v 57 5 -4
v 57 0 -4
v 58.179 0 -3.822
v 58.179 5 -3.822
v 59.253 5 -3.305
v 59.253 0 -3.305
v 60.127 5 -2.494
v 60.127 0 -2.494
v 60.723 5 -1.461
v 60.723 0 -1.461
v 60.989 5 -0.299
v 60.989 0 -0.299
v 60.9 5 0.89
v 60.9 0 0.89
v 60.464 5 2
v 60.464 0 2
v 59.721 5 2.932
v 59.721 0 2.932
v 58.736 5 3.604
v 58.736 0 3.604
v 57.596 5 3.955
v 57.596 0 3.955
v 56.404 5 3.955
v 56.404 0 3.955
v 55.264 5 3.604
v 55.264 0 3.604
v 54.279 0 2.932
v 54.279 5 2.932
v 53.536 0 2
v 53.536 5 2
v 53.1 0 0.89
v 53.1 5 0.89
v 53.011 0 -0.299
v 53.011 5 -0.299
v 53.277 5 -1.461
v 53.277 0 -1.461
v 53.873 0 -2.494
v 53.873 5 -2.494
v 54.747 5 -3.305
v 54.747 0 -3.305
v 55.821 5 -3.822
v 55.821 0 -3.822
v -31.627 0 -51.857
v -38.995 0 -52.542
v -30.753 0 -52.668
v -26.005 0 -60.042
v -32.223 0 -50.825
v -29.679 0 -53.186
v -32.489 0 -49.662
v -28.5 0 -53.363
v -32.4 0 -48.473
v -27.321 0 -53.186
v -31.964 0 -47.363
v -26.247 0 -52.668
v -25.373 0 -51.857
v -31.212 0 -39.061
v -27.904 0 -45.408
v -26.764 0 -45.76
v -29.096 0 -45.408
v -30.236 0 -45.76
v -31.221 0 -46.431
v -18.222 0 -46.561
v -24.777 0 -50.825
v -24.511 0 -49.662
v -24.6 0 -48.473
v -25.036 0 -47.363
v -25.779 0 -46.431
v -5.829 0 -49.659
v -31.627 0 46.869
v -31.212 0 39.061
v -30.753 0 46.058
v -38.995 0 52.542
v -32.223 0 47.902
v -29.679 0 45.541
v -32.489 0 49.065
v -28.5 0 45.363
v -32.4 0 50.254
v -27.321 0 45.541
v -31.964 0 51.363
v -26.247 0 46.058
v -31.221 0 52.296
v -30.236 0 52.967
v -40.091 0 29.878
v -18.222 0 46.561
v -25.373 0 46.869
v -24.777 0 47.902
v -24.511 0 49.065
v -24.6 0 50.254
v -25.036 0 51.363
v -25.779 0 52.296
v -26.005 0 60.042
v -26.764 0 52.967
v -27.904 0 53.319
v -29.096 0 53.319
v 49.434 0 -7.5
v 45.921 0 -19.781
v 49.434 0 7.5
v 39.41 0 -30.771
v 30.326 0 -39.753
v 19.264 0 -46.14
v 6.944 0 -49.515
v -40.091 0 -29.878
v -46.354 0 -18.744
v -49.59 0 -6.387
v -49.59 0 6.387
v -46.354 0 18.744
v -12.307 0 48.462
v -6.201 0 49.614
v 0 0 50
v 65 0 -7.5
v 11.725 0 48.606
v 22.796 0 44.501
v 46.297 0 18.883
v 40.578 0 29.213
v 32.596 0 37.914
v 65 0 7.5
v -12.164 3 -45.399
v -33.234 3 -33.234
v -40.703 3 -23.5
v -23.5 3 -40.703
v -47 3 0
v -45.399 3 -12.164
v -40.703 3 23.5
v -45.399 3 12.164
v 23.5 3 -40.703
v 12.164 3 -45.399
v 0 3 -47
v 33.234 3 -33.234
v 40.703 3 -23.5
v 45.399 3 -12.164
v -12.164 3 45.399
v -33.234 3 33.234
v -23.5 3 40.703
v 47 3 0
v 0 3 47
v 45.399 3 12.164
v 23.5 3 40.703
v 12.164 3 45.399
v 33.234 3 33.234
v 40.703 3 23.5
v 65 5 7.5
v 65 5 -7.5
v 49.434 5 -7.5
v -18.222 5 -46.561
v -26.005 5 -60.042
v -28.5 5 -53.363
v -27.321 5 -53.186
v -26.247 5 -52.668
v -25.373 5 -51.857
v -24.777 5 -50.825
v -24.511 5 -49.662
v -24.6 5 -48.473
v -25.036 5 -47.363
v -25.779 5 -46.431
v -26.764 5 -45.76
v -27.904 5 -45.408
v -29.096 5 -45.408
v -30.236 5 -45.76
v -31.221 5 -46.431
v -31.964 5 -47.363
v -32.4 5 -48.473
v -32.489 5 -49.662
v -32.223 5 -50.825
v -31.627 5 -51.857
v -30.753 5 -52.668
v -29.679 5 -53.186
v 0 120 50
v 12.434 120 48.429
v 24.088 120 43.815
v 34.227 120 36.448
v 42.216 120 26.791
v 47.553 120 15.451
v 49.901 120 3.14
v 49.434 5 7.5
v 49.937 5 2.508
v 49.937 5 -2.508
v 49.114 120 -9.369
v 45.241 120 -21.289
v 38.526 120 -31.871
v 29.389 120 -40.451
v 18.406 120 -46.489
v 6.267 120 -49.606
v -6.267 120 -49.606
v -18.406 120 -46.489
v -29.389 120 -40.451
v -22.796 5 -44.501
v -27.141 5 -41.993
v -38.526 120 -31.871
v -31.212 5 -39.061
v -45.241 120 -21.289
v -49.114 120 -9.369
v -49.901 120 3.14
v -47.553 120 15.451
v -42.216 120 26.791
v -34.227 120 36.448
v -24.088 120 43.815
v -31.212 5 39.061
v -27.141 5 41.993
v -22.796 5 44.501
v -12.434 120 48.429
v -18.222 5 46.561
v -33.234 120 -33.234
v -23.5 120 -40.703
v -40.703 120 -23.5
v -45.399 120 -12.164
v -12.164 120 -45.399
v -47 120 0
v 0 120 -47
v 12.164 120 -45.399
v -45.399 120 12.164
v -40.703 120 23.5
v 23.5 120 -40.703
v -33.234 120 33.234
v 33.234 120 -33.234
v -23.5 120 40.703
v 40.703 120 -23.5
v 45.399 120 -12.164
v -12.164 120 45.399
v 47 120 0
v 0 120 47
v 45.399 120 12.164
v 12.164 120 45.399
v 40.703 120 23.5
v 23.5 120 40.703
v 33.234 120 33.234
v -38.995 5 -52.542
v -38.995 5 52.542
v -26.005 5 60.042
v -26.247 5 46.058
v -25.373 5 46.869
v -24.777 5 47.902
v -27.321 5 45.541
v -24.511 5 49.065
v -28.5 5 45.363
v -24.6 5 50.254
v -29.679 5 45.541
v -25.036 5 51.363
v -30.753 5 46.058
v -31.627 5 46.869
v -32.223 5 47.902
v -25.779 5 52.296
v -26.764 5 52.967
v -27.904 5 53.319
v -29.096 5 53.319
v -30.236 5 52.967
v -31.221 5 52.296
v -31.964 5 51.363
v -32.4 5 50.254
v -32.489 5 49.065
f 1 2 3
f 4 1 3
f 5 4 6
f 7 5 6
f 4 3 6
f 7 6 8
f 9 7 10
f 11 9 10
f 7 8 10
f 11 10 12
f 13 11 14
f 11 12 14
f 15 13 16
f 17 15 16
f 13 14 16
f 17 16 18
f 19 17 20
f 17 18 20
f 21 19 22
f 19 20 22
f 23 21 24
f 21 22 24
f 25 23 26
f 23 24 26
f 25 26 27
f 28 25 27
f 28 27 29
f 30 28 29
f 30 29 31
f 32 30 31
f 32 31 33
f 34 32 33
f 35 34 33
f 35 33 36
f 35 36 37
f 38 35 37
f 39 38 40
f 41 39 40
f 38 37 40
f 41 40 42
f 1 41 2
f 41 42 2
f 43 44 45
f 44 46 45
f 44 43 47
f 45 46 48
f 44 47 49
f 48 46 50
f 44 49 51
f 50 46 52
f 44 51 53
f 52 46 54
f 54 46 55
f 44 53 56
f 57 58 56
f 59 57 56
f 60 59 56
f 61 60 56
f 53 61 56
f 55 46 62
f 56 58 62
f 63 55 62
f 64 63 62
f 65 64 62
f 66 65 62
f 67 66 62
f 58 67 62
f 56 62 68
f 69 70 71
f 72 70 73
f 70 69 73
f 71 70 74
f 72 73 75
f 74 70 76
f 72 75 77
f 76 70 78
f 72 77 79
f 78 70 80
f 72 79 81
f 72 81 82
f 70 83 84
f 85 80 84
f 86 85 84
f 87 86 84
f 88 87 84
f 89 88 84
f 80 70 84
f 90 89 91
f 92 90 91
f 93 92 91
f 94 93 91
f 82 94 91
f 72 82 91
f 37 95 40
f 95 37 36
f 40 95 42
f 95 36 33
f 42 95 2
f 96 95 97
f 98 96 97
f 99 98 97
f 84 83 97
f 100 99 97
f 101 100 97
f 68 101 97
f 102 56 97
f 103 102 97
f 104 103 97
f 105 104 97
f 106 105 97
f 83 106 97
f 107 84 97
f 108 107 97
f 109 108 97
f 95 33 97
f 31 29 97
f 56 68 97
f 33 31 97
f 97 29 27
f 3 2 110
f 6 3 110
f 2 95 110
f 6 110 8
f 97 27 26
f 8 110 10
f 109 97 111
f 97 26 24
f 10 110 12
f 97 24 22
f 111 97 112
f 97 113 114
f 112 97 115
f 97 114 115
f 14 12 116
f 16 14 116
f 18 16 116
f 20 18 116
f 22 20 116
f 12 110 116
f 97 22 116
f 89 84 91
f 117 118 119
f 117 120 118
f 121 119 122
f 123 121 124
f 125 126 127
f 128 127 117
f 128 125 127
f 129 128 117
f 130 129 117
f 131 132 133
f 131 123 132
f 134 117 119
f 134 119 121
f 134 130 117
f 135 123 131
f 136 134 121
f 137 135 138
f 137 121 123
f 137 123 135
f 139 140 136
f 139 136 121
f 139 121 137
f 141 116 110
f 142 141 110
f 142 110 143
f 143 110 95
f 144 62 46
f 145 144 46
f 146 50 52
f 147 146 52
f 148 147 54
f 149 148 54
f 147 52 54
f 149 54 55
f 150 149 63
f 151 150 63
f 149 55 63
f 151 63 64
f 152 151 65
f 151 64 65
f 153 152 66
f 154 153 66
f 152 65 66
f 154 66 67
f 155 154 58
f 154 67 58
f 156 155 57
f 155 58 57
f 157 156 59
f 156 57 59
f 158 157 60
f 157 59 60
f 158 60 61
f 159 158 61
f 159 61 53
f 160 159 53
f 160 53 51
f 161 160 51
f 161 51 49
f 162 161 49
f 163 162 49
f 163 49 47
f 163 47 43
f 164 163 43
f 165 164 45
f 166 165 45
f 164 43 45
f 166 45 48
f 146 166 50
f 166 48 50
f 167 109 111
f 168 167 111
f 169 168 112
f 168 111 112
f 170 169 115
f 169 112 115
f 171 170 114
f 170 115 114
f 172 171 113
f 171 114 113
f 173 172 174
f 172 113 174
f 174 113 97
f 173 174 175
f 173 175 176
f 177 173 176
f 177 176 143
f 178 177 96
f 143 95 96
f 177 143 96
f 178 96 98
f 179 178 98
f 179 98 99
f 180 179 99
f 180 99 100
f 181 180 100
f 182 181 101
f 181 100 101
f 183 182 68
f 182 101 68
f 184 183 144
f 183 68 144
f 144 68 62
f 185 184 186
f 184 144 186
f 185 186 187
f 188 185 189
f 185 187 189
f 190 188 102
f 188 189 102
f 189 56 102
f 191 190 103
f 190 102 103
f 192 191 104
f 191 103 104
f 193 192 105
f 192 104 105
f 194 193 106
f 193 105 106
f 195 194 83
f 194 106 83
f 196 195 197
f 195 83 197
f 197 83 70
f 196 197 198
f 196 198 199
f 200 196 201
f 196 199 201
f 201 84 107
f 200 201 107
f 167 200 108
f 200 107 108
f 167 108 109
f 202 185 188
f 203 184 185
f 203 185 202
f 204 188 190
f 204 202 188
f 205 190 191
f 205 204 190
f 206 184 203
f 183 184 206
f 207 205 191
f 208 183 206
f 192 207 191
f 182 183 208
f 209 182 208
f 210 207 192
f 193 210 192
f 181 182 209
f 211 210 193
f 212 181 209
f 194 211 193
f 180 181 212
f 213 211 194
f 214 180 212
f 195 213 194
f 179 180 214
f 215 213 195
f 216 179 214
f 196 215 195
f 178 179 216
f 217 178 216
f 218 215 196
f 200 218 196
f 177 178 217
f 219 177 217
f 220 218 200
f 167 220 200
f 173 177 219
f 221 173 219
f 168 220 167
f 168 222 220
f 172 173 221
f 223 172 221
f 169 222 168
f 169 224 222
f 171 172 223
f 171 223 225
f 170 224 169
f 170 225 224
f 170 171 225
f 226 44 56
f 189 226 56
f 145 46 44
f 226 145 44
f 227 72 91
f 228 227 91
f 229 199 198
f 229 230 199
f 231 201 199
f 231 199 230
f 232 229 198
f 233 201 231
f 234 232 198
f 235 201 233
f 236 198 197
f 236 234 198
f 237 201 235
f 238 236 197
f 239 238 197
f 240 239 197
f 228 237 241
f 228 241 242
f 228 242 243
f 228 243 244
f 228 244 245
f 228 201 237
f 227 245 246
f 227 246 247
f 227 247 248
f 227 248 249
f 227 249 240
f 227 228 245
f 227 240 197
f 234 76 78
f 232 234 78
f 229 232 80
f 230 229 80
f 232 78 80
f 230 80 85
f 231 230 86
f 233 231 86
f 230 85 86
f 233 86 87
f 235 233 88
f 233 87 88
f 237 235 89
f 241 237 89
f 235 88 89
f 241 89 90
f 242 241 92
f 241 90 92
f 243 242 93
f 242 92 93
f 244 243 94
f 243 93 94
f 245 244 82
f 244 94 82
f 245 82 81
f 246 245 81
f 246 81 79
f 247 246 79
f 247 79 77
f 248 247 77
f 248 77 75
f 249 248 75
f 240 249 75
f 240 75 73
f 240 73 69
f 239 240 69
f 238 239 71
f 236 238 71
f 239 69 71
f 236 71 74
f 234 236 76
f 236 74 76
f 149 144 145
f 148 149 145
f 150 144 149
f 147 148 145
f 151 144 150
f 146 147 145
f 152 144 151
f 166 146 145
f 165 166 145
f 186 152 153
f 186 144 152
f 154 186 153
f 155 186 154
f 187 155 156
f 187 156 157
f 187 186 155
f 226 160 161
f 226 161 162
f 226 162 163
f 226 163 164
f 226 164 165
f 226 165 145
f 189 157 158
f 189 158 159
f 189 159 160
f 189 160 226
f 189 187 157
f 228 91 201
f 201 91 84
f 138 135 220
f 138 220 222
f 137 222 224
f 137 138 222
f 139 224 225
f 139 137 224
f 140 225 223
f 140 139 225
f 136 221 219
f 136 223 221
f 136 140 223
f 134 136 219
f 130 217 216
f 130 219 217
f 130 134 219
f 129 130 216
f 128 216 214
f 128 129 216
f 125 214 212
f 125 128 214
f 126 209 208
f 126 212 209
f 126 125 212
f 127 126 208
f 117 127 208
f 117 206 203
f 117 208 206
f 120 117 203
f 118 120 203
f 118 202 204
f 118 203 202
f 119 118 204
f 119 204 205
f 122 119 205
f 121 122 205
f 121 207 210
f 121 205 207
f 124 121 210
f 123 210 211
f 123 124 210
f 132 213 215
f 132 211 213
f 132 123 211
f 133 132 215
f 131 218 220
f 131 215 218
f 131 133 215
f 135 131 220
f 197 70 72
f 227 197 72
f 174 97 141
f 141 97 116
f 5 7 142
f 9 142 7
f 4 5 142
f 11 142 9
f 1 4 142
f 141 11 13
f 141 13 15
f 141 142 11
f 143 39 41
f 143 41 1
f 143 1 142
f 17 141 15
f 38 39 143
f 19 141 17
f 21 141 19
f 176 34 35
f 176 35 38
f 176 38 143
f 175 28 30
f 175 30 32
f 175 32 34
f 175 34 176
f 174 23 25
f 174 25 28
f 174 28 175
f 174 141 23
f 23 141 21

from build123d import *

# Parameters (mm, degrees)
SKETCH1_R           = 50
BOSS_EXTRUDE1_DEPTH = 120
SHELL1_T            = -3
SKETCH2_R           = 4
BOSS_EXTRUDE2_DEPTH = 5


with BuildPart() as part:
    # Sketch1 → Boss-Extrude1 (new body)
    with BuildSketch(Plane(origin=(0, 0, 0), x_dir=(1, 0, 0), z_dir=(0, 1, 0))):
        with Locations(Location((0, 0, 0), (0, 0, 270))):
            Circle(SKETCH1_R)
    extrude(amount=BOSS_EXTRUDE1_DEPTH)

    # Shell1
    shell1_openings = [part.faces().sort_by_distance(p)[0] for p in [
        (0, 120, 0),
    ]]
    offset(amount=SHELL1_T, openings=shell1_openings, kind=Kind.INTERSECTION)

    # Sketch2 → Boss-Extrude2 (add)
    with BuildSketch(Plane.XZ):
        with BuildLine():
            Line((49.434299833, 7.5), (65, 7.5))
            Line((65, 7.5), (65, -7.5))
            Line((65, -7.5), (49.434299833, -7.5))
            ThreePointArc((49.434299833, -7.5), (50, 0), (49.434299833, 7.5))
        make_face()
        with Locations(Location((57, 0, 0), (0, 0, 270))):
            Circle(SKETCH2_R, mode=Mode.SUBTRACT)
        with BuildLine():
            Line((-18.221959388, -46.561359474), (-26.004809472, -60.041651246))
            Line((-26.004809472, -60.041651246), (-38.995190528, -52.541651246))
            Line((-38.995190528, -52.541651246), (-31.212340445, -39.061359474))
            ThreePointArc((-31.212340445, -39.061359474), (-25, -43.301270189), (-18.221959388, -46.561359474))
        make_face()
        with Locations(Location((-28.5, -49.363448016, 0), (0, 0, 270))):
            Circle(SKETCH2_R, mode=Mode.SUBTRACT)
        with BuildLine():
            Line((-31.212340445, 39.061359474), (-38.995190528, 52.541651246))
            Line((-38.995190528, 52.541651246), (-26.004809472, 60.041651246))
            Line((-26.004809472, 60.041651246), (-18.221959388, 46.561359474))
            ThreePointArc((-18.221959388, 46.561359474), (-25, 43.301270189), (-31.212340445, 39.061359474))
        make_face()
        with Locations(Location((-28.5, 49.363448016, 0), (0, 0, 270))):
            Circle(SKETCH2_R, mode=Mode.SUBTRACT)
    extrude(amount=-BOSS_EXTRUDE2_DEPTH)


solid = part.part
